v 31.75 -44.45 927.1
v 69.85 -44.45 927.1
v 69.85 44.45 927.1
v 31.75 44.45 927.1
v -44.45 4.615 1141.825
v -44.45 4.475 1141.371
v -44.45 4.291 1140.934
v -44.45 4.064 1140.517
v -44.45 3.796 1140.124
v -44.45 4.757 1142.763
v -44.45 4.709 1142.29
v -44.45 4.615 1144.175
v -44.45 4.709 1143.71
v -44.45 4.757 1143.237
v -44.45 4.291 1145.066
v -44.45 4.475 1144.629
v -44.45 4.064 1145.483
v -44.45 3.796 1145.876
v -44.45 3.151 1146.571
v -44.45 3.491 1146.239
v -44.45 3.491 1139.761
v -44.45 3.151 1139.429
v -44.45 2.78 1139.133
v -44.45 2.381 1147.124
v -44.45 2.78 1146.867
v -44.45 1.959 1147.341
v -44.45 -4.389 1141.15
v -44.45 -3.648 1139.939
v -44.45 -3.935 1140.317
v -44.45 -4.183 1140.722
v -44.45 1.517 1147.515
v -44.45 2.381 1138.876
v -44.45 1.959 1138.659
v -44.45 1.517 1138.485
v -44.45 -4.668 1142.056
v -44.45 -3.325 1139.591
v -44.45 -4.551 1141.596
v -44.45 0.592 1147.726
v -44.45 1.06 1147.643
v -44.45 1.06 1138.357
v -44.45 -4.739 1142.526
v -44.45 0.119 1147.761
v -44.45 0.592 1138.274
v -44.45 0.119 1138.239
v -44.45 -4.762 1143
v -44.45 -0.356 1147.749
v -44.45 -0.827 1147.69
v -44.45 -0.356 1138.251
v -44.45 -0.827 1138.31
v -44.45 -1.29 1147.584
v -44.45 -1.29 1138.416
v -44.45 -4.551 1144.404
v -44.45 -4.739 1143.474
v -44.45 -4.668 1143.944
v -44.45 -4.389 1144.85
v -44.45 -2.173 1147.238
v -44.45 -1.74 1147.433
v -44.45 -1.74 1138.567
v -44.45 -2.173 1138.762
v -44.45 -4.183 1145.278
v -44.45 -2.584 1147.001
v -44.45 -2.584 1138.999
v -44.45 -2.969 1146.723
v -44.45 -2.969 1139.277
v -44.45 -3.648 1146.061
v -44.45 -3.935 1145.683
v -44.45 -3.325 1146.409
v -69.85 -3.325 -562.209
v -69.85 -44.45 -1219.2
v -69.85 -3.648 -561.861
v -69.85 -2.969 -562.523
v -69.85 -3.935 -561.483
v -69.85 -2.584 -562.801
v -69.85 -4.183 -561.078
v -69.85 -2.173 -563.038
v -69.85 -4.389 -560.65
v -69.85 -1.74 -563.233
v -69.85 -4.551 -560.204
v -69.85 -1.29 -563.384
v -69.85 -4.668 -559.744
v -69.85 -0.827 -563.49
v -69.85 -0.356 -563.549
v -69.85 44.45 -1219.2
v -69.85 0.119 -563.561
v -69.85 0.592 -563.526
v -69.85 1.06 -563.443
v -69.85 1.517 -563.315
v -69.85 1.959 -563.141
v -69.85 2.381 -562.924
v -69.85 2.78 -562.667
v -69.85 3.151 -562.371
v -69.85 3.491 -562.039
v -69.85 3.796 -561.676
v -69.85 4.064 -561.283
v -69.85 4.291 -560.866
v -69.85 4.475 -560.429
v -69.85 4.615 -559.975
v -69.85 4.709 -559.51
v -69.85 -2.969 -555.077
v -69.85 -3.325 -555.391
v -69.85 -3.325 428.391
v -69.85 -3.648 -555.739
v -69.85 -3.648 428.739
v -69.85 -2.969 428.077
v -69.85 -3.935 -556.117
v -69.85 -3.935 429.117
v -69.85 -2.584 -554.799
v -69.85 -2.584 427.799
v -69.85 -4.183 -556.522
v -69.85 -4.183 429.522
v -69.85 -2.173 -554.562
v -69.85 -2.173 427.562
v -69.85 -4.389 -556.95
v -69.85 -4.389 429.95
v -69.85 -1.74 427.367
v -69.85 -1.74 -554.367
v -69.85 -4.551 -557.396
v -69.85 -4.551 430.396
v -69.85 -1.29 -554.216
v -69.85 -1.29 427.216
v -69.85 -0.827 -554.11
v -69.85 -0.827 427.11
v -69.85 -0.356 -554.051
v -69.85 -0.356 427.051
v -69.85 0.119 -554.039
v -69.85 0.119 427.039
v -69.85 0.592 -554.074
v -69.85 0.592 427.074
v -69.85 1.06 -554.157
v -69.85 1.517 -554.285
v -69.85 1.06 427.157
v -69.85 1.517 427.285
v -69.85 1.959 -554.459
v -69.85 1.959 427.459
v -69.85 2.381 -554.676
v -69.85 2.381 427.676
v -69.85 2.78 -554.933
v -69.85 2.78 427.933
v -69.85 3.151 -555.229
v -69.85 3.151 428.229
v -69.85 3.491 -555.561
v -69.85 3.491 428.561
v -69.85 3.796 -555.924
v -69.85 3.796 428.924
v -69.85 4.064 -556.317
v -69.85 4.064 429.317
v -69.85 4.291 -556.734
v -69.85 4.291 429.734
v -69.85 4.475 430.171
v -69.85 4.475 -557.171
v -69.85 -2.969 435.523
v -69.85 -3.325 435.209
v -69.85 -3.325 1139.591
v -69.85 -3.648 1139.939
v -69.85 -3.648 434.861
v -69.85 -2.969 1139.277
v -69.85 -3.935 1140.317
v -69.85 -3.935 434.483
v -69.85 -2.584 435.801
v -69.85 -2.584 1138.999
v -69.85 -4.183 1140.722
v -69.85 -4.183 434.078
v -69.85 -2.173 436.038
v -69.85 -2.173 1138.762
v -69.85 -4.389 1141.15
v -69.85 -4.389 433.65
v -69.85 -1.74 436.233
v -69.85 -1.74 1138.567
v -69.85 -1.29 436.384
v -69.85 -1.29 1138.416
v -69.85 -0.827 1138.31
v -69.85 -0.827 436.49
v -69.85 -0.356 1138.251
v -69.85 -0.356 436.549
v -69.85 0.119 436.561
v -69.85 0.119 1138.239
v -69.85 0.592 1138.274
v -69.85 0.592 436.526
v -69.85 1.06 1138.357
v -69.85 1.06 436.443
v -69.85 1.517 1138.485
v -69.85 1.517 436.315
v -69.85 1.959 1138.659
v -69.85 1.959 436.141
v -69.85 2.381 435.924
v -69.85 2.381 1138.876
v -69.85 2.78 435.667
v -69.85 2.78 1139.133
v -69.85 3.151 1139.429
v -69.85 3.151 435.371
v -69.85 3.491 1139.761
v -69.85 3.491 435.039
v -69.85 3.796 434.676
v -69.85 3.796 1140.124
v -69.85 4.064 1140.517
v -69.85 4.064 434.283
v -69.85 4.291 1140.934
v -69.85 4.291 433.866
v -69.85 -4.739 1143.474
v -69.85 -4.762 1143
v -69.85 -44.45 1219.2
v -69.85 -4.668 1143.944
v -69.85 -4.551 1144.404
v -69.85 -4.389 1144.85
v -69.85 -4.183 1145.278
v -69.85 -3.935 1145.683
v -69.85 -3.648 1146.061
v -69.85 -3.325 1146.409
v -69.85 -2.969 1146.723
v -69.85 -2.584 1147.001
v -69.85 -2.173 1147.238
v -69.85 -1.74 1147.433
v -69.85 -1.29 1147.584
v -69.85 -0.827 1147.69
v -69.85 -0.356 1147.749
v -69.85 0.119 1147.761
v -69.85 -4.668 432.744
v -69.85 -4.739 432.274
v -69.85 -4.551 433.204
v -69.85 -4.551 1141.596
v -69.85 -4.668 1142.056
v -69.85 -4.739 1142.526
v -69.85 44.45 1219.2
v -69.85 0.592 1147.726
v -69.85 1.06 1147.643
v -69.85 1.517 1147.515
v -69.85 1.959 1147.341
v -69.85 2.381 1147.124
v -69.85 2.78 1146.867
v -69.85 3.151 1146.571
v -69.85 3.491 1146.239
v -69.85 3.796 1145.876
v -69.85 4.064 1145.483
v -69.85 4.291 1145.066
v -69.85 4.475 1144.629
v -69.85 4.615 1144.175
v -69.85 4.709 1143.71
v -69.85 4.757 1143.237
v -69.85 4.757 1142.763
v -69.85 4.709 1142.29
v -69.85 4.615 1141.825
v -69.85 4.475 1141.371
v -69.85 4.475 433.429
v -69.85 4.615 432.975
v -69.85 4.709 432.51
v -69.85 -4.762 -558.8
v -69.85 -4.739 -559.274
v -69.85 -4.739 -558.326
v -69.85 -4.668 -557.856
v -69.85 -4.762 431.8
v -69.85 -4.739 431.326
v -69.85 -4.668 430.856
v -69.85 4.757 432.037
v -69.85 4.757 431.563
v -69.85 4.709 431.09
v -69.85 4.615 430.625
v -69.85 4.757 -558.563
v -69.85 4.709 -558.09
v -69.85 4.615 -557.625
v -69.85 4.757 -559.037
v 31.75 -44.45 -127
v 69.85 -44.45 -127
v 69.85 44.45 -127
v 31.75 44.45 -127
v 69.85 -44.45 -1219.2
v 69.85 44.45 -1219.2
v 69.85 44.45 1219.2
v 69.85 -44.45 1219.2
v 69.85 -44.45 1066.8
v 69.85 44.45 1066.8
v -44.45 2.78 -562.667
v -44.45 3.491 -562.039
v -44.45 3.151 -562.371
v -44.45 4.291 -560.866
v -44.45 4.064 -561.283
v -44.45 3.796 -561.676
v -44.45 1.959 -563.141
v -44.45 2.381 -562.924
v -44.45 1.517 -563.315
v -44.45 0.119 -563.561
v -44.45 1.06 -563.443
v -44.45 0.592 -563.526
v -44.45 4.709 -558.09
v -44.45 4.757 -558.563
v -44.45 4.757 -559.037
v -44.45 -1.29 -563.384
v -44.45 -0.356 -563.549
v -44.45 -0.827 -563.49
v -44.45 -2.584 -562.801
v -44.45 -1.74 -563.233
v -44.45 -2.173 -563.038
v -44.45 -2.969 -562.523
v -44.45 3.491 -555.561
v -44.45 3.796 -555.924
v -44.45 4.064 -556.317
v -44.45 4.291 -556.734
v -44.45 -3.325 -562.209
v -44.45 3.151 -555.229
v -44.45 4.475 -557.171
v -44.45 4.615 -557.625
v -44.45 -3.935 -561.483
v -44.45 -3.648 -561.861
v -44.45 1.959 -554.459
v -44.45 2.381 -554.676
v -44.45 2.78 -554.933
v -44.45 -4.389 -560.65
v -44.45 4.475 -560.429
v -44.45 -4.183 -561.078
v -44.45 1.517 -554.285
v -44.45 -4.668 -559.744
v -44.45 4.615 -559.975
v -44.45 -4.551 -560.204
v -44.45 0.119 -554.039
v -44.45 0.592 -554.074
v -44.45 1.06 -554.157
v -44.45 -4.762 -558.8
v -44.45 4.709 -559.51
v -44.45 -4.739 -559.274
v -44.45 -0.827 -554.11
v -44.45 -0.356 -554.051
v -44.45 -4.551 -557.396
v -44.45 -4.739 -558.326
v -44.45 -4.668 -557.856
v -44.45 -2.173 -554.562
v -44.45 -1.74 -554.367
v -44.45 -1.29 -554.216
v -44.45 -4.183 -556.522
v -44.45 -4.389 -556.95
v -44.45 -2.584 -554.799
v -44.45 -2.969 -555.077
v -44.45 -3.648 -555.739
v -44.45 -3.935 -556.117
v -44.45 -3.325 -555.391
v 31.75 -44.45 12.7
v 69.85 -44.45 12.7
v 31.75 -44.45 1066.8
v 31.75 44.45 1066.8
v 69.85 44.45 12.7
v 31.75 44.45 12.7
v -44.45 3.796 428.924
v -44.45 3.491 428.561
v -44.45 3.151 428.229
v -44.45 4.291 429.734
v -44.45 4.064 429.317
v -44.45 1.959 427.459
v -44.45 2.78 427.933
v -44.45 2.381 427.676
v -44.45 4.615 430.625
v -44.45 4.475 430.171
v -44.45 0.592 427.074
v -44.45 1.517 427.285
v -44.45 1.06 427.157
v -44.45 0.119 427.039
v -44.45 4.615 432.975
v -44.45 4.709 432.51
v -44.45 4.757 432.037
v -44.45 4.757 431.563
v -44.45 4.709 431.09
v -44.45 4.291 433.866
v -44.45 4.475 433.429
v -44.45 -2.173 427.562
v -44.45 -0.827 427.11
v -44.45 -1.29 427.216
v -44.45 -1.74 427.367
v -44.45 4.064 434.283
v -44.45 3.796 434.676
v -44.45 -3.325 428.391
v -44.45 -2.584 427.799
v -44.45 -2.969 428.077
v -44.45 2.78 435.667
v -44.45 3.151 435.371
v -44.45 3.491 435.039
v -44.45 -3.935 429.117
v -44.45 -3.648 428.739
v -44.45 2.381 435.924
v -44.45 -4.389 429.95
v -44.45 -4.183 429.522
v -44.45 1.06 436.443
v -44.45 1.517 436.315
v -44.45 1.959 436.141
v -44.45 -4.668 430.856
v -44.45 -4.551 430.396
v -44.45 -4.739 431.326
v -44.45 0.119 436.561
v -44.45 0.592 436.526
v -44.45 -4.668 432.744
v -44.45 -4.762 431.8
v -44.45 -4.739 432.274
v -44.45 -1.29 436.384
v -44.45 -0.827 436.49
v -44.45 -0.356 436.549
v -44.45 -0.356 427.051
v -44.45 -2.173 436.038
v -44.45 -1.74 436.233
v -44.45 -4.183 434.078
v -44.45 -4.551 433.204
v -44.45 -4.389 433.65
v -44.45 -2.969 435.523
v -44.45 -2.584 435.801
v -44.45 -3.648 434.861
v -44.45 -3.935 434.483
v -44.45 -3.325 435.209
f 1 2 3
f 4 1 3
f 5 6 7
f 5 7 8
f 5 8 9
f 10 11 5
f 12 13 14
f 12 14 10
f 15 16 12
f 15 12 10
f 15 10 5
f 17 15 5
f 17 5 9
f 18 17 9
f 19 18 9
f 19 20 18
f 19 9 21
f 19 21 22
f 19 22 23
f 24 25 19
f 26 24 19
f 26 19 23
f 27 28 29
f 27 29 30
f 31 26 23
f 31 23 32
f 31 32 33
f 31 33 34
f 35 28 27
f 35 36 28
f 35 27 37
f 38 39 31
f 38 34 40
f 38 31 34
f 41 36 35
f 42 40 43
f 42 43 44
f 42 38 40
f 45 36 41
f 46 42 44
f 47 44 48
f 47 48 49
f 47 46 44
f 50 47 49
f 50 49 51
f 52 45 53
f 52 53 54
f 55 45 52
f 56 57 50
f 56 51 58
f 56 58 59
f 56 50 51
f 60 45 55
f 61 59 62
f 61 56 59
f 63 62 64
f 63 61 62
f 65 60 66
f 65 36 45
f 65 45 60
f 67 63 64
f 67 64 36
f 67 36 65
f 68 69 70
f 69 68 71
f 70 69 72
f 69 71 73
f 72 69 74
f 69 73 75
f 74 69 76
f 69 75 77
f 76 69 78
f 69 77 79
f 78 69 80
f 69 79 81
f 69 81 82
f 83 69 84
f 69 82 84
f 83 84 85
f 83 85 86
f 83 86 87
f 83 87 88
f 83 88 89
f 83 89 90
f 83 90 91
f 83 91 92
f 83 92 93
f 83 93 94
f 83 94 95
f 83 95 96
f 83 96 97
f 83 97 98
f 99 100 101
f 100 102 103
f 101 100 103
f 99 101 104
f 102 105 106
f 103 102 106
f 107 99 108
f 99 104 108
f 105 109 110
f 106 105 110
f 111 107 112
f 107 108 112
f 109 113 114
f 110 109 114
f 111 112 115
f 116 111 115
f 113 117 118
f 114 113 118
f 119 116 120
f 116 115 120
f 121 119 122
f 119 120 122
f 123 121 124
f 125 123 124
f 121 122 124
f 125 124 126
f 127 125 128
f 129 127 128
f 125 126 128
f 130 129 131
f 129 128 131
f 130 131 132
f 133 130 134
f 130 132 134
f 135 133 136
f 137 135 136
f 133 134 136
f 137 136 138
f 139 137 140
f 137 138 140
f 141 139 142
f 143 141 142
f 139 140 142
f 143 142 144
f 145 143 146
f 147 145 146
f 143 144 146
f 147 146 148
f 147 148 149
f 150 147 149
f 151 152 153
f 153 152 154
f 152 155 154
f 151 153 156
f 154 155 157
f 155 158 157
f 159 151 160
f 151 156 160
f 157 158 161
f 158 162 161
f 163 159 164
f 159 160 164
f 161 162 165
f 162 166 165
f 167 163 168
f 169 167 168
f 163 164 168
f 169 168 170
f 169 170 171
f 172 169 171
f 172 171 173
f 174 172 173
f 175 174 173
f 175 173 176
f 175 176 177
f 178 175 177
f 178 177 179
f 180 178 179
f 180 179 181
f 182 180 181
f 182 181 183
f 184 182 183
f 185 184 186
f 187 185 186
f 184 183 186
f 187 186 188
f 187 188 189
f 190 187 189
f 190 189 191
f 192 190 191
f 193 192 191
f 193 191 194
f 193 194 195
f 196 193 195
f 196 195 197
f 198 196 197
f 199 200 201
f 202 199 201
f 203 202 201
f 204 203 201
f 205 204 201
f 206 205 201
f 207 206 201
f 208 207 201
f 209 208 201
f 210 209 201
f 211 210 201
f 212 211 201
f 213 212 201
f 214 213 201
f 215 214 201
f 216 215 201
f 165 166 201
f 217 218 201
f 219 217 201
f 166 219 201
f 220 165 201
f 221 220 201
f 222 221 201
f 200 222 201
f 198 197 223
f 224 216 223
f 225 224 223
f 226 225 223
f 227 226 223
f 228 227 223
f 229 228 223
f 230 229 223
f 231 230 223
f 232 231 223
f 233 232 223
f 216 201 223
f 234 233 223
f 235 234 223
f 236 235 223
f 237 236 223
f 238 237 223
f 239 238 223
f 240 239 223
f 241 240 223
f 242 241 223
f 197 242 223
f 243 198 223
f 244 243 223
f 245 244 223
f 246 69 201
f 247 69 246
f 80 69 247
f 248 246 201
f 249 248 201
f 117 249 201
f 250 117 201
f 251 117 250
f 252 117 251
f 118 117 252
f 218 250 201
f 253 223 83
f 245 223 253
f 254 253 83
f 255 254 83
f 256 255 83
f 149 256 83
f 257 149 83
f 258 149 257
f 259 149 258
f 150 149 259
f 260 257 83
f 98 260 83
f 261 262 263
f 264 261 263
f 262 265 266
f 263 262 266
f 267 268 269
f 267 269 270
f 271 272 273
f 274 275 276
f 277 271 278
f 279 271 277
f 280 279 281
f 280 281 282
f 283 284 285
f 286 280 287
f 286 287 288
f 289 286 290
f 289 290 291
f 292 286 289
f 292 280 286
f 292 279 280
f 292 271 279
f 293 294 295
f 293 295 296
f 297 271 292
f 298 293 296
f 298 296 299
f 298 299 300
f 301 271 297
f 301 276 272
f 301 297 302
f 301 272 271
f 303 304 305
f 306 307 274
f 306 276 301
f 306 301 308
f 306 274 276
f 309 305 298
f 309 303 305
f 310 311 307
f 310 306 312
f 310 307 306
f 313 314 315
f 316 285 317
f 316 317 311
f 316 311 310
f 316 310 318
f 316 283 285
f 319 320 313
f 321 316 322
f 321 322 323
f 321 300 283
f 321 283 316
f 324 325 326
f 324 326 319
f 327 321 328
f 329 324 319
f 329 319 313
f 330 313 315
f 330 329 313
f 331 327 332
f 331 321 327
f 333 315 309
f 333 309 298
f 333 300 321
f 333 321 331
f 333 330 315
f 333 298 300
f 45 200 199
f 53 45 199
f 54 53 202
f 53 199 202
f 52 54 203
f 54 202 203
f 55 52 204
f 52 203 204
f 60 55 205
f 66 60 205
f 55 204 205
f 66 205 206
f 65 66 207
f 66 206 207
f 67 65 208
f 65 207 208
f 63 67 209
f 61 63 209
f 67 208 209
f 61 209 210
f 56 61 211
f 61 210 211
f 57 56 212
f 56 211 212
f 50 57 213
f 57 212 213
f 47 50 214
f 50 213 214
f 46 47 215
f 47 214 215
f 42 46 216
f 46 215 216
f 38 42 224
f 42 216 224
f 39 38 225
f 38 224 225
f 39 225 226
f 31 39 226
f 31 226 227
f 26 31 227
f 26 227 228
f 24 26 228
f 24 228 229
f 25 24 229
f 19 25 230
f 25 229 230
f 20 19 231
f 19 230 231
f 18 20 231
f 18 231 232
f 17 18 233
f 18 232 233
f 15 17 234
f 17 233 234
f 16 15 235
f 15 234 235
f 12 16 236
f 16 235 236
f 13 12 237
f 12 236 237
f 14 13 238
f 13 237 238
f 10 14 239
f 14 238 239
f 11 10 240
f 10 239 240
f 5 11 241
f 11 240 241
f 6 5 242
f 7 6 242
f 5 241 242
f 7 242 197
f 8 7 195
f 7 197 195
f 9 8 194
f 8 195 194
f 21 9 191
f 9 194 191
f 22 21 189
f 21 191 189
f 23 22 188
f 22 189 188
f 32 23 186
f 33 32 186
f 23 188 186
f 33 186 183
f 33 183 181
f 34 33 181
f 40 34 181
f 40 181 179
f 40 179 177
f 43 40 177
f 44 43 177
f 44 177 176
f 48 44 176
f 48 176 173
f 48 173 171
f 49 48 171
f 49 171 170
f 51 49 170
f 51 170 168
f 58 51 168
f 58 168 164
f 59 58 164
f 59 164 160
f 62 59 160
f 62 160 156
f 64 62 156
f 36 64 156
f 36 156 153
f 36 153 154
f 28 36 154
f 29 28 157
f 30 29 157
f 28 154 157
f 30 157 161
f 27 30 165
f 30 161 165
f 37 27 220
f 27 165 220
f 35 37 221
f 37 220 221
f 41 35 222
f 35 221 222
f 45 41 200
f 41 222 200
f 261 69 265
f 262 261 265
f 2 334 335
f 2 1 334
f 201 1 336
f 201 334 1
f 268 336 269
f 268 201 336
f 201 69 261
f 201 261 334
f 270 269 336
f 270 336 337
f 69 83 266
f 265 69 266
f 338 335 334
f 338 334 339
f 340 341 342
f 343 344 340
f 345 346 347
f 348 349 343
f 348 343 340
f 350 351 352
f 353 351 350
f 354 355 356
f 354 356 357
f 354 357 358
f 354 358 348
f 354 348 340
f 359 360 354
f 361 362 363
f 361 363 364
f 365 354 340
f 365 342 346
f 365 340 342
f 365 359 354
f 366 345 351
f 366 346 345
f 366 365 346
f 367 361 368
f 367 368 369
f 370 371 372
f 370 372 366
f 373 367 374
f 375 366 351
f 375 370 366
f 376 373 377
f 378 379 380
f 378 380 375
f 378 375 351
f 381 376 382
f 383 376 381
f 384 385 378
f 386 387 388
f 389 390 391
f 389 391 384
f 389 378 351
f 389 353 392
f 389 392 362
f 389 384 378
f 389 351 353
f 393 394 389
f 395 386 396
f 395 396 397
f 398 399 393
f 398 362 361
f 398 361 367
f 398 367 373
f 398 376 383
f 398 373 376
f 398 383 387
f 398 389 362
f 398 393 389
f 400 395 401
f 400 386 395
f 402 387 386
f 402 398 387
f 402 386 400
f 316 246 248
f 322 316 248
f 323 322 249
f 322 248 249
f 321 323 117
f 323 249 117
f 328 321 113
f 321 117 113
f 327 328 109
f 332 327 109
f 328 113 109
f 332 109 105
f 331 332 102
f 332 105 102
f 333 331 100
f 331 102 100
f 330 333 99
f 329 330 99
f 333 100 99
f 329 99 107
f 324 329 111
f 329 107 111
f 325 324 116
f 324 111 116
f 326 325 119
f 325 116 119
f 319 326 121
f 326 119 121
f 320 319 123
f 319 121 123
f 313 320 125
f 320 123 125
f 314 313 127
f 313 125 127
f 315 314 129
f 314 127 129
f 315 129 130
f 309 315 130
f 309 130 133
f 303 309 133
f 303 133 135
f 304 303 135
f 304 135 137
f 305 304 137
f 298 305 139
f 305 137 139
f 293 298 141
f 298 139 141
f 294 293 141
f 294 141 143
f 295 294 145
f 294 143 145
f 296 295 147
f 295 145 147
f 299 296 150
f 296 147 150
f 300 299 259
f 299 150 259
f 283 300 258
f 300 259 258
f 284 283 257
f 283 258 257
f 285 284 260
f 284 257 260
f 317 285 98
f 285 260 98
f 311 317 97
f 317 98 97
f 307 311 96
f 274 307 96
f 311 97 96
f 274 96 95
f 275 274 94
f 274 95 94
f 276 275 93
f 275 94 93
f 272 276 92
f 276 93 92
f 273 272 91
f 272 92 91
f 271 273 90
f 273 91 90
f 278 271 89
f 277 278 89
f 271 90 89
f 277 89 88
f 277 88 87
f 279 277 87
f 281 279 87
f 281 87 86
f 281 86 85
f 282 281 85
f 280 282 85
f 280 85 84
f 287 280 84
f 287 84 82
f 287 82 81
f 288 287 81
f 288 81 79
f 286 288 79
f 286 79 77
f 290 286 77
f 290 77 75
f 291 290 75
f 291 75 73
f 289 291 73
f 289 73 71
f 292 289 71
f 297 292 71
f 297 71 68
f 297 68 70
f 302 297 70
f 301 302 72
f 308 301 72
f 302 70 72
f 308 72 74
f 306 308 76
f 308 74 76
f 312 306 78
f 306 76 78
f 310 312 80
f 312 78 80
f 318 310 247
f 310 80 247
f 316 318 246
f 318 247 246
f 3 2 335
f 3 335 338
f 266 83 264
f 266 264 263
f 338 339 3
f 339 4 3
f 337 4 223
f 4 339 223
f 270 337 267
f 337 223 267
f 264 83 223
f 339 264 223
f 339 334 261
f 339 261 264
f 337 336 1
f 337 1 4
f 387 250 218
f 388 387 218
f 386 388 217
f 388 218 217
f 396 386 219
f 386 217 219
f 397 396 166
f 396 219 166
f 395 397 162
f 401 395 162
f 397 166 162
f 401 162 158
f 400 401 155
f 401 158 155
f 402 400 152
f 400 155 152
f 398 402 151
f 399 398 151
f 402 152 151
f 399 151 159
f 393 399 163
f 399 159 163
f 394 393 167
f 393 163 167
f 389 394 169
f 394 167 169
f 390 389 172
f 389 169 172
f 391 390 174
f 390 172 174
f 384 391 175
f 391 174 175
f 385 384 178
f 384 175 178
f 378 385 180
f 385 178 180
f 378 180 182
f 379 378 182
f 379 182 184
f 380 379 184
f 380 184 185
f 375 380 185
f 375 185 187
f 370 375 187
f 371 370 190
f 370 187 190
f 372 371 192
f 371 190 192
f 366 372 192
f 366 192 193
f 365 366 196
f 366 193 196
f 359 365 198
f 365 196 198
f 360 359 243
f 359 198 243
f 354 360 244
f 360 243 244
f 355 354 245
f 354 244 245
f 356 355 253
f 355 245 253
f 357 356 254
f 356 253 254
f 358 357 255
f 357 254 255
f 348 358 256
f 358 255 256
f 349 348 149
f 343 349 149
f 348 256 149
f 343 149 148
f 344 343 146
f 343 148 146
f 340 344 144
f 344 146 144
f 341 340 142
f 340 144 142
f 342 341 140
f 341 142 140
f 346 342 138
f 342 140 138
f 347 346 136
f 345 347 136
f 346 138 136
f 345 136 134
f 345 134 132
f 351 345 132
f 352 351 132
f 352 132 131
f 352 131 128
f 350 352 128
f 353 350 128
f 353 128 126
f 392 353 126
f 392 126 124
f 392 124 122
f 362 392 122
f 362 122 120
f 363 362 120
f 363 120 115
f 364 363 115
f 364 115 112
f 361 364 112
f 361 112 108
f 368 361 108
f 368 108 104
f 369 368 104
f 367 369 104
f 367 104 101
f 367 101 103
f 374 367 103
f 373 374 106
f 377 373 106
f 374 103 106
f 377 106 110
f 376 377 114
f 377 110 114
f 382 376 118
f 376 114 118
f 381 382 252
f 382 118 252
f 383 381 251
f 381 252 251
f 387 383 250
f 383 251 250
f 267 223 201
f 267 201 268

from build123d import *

# Parameters (mm, degrees)
F0_W     = 139.7
F0_H     = 88.9
F1_DEPTH = 1219.2
F2_W     = 88.9
F2_H     = 139.7
F3_DEPTH = 38.1
F4_R     = 4.7625
F5_DEPTH = 25.4


with BuildPart() as f1:
    # F0 (on Top) → F1 (new body, symmetric)
    with BuildSketch(Plane.XY):
        Rectangle(F0_W, F0_H)
    extrude(amount=F1_DEPTH, both=True)

    # F2 (on face) → F3 (cut)
    with BuildSketch(Plane.YZ.offset(69.85)):
        with Locations((0, 996.95)):
            Rectangle(F2_W, F2_H)
        with Locations((0, -57.15)):
            Rectangle(F2_W, F2_H)
    extrude(amount=-F3_DEPTH, mode=Mode.SUBTRACT)

    # F4 (on face) → F5 (cut)
    with BuildSketch(Plane(origin=(-69.85, 0, 0), x_dir=(0, -1, 0), z_dir=(-1, 0, 0))):
        with Locations((0, -558.8)):
            Circle(F4_R)
        with Locations((0, 431.8)):
            Circle(F4_R)
        with Locations((0, 1143)):
            Circle(F4_R)
    extrude(amount=-F5_DEPTH, mode=Mode.SUBTRACT)


solid = f1.part
